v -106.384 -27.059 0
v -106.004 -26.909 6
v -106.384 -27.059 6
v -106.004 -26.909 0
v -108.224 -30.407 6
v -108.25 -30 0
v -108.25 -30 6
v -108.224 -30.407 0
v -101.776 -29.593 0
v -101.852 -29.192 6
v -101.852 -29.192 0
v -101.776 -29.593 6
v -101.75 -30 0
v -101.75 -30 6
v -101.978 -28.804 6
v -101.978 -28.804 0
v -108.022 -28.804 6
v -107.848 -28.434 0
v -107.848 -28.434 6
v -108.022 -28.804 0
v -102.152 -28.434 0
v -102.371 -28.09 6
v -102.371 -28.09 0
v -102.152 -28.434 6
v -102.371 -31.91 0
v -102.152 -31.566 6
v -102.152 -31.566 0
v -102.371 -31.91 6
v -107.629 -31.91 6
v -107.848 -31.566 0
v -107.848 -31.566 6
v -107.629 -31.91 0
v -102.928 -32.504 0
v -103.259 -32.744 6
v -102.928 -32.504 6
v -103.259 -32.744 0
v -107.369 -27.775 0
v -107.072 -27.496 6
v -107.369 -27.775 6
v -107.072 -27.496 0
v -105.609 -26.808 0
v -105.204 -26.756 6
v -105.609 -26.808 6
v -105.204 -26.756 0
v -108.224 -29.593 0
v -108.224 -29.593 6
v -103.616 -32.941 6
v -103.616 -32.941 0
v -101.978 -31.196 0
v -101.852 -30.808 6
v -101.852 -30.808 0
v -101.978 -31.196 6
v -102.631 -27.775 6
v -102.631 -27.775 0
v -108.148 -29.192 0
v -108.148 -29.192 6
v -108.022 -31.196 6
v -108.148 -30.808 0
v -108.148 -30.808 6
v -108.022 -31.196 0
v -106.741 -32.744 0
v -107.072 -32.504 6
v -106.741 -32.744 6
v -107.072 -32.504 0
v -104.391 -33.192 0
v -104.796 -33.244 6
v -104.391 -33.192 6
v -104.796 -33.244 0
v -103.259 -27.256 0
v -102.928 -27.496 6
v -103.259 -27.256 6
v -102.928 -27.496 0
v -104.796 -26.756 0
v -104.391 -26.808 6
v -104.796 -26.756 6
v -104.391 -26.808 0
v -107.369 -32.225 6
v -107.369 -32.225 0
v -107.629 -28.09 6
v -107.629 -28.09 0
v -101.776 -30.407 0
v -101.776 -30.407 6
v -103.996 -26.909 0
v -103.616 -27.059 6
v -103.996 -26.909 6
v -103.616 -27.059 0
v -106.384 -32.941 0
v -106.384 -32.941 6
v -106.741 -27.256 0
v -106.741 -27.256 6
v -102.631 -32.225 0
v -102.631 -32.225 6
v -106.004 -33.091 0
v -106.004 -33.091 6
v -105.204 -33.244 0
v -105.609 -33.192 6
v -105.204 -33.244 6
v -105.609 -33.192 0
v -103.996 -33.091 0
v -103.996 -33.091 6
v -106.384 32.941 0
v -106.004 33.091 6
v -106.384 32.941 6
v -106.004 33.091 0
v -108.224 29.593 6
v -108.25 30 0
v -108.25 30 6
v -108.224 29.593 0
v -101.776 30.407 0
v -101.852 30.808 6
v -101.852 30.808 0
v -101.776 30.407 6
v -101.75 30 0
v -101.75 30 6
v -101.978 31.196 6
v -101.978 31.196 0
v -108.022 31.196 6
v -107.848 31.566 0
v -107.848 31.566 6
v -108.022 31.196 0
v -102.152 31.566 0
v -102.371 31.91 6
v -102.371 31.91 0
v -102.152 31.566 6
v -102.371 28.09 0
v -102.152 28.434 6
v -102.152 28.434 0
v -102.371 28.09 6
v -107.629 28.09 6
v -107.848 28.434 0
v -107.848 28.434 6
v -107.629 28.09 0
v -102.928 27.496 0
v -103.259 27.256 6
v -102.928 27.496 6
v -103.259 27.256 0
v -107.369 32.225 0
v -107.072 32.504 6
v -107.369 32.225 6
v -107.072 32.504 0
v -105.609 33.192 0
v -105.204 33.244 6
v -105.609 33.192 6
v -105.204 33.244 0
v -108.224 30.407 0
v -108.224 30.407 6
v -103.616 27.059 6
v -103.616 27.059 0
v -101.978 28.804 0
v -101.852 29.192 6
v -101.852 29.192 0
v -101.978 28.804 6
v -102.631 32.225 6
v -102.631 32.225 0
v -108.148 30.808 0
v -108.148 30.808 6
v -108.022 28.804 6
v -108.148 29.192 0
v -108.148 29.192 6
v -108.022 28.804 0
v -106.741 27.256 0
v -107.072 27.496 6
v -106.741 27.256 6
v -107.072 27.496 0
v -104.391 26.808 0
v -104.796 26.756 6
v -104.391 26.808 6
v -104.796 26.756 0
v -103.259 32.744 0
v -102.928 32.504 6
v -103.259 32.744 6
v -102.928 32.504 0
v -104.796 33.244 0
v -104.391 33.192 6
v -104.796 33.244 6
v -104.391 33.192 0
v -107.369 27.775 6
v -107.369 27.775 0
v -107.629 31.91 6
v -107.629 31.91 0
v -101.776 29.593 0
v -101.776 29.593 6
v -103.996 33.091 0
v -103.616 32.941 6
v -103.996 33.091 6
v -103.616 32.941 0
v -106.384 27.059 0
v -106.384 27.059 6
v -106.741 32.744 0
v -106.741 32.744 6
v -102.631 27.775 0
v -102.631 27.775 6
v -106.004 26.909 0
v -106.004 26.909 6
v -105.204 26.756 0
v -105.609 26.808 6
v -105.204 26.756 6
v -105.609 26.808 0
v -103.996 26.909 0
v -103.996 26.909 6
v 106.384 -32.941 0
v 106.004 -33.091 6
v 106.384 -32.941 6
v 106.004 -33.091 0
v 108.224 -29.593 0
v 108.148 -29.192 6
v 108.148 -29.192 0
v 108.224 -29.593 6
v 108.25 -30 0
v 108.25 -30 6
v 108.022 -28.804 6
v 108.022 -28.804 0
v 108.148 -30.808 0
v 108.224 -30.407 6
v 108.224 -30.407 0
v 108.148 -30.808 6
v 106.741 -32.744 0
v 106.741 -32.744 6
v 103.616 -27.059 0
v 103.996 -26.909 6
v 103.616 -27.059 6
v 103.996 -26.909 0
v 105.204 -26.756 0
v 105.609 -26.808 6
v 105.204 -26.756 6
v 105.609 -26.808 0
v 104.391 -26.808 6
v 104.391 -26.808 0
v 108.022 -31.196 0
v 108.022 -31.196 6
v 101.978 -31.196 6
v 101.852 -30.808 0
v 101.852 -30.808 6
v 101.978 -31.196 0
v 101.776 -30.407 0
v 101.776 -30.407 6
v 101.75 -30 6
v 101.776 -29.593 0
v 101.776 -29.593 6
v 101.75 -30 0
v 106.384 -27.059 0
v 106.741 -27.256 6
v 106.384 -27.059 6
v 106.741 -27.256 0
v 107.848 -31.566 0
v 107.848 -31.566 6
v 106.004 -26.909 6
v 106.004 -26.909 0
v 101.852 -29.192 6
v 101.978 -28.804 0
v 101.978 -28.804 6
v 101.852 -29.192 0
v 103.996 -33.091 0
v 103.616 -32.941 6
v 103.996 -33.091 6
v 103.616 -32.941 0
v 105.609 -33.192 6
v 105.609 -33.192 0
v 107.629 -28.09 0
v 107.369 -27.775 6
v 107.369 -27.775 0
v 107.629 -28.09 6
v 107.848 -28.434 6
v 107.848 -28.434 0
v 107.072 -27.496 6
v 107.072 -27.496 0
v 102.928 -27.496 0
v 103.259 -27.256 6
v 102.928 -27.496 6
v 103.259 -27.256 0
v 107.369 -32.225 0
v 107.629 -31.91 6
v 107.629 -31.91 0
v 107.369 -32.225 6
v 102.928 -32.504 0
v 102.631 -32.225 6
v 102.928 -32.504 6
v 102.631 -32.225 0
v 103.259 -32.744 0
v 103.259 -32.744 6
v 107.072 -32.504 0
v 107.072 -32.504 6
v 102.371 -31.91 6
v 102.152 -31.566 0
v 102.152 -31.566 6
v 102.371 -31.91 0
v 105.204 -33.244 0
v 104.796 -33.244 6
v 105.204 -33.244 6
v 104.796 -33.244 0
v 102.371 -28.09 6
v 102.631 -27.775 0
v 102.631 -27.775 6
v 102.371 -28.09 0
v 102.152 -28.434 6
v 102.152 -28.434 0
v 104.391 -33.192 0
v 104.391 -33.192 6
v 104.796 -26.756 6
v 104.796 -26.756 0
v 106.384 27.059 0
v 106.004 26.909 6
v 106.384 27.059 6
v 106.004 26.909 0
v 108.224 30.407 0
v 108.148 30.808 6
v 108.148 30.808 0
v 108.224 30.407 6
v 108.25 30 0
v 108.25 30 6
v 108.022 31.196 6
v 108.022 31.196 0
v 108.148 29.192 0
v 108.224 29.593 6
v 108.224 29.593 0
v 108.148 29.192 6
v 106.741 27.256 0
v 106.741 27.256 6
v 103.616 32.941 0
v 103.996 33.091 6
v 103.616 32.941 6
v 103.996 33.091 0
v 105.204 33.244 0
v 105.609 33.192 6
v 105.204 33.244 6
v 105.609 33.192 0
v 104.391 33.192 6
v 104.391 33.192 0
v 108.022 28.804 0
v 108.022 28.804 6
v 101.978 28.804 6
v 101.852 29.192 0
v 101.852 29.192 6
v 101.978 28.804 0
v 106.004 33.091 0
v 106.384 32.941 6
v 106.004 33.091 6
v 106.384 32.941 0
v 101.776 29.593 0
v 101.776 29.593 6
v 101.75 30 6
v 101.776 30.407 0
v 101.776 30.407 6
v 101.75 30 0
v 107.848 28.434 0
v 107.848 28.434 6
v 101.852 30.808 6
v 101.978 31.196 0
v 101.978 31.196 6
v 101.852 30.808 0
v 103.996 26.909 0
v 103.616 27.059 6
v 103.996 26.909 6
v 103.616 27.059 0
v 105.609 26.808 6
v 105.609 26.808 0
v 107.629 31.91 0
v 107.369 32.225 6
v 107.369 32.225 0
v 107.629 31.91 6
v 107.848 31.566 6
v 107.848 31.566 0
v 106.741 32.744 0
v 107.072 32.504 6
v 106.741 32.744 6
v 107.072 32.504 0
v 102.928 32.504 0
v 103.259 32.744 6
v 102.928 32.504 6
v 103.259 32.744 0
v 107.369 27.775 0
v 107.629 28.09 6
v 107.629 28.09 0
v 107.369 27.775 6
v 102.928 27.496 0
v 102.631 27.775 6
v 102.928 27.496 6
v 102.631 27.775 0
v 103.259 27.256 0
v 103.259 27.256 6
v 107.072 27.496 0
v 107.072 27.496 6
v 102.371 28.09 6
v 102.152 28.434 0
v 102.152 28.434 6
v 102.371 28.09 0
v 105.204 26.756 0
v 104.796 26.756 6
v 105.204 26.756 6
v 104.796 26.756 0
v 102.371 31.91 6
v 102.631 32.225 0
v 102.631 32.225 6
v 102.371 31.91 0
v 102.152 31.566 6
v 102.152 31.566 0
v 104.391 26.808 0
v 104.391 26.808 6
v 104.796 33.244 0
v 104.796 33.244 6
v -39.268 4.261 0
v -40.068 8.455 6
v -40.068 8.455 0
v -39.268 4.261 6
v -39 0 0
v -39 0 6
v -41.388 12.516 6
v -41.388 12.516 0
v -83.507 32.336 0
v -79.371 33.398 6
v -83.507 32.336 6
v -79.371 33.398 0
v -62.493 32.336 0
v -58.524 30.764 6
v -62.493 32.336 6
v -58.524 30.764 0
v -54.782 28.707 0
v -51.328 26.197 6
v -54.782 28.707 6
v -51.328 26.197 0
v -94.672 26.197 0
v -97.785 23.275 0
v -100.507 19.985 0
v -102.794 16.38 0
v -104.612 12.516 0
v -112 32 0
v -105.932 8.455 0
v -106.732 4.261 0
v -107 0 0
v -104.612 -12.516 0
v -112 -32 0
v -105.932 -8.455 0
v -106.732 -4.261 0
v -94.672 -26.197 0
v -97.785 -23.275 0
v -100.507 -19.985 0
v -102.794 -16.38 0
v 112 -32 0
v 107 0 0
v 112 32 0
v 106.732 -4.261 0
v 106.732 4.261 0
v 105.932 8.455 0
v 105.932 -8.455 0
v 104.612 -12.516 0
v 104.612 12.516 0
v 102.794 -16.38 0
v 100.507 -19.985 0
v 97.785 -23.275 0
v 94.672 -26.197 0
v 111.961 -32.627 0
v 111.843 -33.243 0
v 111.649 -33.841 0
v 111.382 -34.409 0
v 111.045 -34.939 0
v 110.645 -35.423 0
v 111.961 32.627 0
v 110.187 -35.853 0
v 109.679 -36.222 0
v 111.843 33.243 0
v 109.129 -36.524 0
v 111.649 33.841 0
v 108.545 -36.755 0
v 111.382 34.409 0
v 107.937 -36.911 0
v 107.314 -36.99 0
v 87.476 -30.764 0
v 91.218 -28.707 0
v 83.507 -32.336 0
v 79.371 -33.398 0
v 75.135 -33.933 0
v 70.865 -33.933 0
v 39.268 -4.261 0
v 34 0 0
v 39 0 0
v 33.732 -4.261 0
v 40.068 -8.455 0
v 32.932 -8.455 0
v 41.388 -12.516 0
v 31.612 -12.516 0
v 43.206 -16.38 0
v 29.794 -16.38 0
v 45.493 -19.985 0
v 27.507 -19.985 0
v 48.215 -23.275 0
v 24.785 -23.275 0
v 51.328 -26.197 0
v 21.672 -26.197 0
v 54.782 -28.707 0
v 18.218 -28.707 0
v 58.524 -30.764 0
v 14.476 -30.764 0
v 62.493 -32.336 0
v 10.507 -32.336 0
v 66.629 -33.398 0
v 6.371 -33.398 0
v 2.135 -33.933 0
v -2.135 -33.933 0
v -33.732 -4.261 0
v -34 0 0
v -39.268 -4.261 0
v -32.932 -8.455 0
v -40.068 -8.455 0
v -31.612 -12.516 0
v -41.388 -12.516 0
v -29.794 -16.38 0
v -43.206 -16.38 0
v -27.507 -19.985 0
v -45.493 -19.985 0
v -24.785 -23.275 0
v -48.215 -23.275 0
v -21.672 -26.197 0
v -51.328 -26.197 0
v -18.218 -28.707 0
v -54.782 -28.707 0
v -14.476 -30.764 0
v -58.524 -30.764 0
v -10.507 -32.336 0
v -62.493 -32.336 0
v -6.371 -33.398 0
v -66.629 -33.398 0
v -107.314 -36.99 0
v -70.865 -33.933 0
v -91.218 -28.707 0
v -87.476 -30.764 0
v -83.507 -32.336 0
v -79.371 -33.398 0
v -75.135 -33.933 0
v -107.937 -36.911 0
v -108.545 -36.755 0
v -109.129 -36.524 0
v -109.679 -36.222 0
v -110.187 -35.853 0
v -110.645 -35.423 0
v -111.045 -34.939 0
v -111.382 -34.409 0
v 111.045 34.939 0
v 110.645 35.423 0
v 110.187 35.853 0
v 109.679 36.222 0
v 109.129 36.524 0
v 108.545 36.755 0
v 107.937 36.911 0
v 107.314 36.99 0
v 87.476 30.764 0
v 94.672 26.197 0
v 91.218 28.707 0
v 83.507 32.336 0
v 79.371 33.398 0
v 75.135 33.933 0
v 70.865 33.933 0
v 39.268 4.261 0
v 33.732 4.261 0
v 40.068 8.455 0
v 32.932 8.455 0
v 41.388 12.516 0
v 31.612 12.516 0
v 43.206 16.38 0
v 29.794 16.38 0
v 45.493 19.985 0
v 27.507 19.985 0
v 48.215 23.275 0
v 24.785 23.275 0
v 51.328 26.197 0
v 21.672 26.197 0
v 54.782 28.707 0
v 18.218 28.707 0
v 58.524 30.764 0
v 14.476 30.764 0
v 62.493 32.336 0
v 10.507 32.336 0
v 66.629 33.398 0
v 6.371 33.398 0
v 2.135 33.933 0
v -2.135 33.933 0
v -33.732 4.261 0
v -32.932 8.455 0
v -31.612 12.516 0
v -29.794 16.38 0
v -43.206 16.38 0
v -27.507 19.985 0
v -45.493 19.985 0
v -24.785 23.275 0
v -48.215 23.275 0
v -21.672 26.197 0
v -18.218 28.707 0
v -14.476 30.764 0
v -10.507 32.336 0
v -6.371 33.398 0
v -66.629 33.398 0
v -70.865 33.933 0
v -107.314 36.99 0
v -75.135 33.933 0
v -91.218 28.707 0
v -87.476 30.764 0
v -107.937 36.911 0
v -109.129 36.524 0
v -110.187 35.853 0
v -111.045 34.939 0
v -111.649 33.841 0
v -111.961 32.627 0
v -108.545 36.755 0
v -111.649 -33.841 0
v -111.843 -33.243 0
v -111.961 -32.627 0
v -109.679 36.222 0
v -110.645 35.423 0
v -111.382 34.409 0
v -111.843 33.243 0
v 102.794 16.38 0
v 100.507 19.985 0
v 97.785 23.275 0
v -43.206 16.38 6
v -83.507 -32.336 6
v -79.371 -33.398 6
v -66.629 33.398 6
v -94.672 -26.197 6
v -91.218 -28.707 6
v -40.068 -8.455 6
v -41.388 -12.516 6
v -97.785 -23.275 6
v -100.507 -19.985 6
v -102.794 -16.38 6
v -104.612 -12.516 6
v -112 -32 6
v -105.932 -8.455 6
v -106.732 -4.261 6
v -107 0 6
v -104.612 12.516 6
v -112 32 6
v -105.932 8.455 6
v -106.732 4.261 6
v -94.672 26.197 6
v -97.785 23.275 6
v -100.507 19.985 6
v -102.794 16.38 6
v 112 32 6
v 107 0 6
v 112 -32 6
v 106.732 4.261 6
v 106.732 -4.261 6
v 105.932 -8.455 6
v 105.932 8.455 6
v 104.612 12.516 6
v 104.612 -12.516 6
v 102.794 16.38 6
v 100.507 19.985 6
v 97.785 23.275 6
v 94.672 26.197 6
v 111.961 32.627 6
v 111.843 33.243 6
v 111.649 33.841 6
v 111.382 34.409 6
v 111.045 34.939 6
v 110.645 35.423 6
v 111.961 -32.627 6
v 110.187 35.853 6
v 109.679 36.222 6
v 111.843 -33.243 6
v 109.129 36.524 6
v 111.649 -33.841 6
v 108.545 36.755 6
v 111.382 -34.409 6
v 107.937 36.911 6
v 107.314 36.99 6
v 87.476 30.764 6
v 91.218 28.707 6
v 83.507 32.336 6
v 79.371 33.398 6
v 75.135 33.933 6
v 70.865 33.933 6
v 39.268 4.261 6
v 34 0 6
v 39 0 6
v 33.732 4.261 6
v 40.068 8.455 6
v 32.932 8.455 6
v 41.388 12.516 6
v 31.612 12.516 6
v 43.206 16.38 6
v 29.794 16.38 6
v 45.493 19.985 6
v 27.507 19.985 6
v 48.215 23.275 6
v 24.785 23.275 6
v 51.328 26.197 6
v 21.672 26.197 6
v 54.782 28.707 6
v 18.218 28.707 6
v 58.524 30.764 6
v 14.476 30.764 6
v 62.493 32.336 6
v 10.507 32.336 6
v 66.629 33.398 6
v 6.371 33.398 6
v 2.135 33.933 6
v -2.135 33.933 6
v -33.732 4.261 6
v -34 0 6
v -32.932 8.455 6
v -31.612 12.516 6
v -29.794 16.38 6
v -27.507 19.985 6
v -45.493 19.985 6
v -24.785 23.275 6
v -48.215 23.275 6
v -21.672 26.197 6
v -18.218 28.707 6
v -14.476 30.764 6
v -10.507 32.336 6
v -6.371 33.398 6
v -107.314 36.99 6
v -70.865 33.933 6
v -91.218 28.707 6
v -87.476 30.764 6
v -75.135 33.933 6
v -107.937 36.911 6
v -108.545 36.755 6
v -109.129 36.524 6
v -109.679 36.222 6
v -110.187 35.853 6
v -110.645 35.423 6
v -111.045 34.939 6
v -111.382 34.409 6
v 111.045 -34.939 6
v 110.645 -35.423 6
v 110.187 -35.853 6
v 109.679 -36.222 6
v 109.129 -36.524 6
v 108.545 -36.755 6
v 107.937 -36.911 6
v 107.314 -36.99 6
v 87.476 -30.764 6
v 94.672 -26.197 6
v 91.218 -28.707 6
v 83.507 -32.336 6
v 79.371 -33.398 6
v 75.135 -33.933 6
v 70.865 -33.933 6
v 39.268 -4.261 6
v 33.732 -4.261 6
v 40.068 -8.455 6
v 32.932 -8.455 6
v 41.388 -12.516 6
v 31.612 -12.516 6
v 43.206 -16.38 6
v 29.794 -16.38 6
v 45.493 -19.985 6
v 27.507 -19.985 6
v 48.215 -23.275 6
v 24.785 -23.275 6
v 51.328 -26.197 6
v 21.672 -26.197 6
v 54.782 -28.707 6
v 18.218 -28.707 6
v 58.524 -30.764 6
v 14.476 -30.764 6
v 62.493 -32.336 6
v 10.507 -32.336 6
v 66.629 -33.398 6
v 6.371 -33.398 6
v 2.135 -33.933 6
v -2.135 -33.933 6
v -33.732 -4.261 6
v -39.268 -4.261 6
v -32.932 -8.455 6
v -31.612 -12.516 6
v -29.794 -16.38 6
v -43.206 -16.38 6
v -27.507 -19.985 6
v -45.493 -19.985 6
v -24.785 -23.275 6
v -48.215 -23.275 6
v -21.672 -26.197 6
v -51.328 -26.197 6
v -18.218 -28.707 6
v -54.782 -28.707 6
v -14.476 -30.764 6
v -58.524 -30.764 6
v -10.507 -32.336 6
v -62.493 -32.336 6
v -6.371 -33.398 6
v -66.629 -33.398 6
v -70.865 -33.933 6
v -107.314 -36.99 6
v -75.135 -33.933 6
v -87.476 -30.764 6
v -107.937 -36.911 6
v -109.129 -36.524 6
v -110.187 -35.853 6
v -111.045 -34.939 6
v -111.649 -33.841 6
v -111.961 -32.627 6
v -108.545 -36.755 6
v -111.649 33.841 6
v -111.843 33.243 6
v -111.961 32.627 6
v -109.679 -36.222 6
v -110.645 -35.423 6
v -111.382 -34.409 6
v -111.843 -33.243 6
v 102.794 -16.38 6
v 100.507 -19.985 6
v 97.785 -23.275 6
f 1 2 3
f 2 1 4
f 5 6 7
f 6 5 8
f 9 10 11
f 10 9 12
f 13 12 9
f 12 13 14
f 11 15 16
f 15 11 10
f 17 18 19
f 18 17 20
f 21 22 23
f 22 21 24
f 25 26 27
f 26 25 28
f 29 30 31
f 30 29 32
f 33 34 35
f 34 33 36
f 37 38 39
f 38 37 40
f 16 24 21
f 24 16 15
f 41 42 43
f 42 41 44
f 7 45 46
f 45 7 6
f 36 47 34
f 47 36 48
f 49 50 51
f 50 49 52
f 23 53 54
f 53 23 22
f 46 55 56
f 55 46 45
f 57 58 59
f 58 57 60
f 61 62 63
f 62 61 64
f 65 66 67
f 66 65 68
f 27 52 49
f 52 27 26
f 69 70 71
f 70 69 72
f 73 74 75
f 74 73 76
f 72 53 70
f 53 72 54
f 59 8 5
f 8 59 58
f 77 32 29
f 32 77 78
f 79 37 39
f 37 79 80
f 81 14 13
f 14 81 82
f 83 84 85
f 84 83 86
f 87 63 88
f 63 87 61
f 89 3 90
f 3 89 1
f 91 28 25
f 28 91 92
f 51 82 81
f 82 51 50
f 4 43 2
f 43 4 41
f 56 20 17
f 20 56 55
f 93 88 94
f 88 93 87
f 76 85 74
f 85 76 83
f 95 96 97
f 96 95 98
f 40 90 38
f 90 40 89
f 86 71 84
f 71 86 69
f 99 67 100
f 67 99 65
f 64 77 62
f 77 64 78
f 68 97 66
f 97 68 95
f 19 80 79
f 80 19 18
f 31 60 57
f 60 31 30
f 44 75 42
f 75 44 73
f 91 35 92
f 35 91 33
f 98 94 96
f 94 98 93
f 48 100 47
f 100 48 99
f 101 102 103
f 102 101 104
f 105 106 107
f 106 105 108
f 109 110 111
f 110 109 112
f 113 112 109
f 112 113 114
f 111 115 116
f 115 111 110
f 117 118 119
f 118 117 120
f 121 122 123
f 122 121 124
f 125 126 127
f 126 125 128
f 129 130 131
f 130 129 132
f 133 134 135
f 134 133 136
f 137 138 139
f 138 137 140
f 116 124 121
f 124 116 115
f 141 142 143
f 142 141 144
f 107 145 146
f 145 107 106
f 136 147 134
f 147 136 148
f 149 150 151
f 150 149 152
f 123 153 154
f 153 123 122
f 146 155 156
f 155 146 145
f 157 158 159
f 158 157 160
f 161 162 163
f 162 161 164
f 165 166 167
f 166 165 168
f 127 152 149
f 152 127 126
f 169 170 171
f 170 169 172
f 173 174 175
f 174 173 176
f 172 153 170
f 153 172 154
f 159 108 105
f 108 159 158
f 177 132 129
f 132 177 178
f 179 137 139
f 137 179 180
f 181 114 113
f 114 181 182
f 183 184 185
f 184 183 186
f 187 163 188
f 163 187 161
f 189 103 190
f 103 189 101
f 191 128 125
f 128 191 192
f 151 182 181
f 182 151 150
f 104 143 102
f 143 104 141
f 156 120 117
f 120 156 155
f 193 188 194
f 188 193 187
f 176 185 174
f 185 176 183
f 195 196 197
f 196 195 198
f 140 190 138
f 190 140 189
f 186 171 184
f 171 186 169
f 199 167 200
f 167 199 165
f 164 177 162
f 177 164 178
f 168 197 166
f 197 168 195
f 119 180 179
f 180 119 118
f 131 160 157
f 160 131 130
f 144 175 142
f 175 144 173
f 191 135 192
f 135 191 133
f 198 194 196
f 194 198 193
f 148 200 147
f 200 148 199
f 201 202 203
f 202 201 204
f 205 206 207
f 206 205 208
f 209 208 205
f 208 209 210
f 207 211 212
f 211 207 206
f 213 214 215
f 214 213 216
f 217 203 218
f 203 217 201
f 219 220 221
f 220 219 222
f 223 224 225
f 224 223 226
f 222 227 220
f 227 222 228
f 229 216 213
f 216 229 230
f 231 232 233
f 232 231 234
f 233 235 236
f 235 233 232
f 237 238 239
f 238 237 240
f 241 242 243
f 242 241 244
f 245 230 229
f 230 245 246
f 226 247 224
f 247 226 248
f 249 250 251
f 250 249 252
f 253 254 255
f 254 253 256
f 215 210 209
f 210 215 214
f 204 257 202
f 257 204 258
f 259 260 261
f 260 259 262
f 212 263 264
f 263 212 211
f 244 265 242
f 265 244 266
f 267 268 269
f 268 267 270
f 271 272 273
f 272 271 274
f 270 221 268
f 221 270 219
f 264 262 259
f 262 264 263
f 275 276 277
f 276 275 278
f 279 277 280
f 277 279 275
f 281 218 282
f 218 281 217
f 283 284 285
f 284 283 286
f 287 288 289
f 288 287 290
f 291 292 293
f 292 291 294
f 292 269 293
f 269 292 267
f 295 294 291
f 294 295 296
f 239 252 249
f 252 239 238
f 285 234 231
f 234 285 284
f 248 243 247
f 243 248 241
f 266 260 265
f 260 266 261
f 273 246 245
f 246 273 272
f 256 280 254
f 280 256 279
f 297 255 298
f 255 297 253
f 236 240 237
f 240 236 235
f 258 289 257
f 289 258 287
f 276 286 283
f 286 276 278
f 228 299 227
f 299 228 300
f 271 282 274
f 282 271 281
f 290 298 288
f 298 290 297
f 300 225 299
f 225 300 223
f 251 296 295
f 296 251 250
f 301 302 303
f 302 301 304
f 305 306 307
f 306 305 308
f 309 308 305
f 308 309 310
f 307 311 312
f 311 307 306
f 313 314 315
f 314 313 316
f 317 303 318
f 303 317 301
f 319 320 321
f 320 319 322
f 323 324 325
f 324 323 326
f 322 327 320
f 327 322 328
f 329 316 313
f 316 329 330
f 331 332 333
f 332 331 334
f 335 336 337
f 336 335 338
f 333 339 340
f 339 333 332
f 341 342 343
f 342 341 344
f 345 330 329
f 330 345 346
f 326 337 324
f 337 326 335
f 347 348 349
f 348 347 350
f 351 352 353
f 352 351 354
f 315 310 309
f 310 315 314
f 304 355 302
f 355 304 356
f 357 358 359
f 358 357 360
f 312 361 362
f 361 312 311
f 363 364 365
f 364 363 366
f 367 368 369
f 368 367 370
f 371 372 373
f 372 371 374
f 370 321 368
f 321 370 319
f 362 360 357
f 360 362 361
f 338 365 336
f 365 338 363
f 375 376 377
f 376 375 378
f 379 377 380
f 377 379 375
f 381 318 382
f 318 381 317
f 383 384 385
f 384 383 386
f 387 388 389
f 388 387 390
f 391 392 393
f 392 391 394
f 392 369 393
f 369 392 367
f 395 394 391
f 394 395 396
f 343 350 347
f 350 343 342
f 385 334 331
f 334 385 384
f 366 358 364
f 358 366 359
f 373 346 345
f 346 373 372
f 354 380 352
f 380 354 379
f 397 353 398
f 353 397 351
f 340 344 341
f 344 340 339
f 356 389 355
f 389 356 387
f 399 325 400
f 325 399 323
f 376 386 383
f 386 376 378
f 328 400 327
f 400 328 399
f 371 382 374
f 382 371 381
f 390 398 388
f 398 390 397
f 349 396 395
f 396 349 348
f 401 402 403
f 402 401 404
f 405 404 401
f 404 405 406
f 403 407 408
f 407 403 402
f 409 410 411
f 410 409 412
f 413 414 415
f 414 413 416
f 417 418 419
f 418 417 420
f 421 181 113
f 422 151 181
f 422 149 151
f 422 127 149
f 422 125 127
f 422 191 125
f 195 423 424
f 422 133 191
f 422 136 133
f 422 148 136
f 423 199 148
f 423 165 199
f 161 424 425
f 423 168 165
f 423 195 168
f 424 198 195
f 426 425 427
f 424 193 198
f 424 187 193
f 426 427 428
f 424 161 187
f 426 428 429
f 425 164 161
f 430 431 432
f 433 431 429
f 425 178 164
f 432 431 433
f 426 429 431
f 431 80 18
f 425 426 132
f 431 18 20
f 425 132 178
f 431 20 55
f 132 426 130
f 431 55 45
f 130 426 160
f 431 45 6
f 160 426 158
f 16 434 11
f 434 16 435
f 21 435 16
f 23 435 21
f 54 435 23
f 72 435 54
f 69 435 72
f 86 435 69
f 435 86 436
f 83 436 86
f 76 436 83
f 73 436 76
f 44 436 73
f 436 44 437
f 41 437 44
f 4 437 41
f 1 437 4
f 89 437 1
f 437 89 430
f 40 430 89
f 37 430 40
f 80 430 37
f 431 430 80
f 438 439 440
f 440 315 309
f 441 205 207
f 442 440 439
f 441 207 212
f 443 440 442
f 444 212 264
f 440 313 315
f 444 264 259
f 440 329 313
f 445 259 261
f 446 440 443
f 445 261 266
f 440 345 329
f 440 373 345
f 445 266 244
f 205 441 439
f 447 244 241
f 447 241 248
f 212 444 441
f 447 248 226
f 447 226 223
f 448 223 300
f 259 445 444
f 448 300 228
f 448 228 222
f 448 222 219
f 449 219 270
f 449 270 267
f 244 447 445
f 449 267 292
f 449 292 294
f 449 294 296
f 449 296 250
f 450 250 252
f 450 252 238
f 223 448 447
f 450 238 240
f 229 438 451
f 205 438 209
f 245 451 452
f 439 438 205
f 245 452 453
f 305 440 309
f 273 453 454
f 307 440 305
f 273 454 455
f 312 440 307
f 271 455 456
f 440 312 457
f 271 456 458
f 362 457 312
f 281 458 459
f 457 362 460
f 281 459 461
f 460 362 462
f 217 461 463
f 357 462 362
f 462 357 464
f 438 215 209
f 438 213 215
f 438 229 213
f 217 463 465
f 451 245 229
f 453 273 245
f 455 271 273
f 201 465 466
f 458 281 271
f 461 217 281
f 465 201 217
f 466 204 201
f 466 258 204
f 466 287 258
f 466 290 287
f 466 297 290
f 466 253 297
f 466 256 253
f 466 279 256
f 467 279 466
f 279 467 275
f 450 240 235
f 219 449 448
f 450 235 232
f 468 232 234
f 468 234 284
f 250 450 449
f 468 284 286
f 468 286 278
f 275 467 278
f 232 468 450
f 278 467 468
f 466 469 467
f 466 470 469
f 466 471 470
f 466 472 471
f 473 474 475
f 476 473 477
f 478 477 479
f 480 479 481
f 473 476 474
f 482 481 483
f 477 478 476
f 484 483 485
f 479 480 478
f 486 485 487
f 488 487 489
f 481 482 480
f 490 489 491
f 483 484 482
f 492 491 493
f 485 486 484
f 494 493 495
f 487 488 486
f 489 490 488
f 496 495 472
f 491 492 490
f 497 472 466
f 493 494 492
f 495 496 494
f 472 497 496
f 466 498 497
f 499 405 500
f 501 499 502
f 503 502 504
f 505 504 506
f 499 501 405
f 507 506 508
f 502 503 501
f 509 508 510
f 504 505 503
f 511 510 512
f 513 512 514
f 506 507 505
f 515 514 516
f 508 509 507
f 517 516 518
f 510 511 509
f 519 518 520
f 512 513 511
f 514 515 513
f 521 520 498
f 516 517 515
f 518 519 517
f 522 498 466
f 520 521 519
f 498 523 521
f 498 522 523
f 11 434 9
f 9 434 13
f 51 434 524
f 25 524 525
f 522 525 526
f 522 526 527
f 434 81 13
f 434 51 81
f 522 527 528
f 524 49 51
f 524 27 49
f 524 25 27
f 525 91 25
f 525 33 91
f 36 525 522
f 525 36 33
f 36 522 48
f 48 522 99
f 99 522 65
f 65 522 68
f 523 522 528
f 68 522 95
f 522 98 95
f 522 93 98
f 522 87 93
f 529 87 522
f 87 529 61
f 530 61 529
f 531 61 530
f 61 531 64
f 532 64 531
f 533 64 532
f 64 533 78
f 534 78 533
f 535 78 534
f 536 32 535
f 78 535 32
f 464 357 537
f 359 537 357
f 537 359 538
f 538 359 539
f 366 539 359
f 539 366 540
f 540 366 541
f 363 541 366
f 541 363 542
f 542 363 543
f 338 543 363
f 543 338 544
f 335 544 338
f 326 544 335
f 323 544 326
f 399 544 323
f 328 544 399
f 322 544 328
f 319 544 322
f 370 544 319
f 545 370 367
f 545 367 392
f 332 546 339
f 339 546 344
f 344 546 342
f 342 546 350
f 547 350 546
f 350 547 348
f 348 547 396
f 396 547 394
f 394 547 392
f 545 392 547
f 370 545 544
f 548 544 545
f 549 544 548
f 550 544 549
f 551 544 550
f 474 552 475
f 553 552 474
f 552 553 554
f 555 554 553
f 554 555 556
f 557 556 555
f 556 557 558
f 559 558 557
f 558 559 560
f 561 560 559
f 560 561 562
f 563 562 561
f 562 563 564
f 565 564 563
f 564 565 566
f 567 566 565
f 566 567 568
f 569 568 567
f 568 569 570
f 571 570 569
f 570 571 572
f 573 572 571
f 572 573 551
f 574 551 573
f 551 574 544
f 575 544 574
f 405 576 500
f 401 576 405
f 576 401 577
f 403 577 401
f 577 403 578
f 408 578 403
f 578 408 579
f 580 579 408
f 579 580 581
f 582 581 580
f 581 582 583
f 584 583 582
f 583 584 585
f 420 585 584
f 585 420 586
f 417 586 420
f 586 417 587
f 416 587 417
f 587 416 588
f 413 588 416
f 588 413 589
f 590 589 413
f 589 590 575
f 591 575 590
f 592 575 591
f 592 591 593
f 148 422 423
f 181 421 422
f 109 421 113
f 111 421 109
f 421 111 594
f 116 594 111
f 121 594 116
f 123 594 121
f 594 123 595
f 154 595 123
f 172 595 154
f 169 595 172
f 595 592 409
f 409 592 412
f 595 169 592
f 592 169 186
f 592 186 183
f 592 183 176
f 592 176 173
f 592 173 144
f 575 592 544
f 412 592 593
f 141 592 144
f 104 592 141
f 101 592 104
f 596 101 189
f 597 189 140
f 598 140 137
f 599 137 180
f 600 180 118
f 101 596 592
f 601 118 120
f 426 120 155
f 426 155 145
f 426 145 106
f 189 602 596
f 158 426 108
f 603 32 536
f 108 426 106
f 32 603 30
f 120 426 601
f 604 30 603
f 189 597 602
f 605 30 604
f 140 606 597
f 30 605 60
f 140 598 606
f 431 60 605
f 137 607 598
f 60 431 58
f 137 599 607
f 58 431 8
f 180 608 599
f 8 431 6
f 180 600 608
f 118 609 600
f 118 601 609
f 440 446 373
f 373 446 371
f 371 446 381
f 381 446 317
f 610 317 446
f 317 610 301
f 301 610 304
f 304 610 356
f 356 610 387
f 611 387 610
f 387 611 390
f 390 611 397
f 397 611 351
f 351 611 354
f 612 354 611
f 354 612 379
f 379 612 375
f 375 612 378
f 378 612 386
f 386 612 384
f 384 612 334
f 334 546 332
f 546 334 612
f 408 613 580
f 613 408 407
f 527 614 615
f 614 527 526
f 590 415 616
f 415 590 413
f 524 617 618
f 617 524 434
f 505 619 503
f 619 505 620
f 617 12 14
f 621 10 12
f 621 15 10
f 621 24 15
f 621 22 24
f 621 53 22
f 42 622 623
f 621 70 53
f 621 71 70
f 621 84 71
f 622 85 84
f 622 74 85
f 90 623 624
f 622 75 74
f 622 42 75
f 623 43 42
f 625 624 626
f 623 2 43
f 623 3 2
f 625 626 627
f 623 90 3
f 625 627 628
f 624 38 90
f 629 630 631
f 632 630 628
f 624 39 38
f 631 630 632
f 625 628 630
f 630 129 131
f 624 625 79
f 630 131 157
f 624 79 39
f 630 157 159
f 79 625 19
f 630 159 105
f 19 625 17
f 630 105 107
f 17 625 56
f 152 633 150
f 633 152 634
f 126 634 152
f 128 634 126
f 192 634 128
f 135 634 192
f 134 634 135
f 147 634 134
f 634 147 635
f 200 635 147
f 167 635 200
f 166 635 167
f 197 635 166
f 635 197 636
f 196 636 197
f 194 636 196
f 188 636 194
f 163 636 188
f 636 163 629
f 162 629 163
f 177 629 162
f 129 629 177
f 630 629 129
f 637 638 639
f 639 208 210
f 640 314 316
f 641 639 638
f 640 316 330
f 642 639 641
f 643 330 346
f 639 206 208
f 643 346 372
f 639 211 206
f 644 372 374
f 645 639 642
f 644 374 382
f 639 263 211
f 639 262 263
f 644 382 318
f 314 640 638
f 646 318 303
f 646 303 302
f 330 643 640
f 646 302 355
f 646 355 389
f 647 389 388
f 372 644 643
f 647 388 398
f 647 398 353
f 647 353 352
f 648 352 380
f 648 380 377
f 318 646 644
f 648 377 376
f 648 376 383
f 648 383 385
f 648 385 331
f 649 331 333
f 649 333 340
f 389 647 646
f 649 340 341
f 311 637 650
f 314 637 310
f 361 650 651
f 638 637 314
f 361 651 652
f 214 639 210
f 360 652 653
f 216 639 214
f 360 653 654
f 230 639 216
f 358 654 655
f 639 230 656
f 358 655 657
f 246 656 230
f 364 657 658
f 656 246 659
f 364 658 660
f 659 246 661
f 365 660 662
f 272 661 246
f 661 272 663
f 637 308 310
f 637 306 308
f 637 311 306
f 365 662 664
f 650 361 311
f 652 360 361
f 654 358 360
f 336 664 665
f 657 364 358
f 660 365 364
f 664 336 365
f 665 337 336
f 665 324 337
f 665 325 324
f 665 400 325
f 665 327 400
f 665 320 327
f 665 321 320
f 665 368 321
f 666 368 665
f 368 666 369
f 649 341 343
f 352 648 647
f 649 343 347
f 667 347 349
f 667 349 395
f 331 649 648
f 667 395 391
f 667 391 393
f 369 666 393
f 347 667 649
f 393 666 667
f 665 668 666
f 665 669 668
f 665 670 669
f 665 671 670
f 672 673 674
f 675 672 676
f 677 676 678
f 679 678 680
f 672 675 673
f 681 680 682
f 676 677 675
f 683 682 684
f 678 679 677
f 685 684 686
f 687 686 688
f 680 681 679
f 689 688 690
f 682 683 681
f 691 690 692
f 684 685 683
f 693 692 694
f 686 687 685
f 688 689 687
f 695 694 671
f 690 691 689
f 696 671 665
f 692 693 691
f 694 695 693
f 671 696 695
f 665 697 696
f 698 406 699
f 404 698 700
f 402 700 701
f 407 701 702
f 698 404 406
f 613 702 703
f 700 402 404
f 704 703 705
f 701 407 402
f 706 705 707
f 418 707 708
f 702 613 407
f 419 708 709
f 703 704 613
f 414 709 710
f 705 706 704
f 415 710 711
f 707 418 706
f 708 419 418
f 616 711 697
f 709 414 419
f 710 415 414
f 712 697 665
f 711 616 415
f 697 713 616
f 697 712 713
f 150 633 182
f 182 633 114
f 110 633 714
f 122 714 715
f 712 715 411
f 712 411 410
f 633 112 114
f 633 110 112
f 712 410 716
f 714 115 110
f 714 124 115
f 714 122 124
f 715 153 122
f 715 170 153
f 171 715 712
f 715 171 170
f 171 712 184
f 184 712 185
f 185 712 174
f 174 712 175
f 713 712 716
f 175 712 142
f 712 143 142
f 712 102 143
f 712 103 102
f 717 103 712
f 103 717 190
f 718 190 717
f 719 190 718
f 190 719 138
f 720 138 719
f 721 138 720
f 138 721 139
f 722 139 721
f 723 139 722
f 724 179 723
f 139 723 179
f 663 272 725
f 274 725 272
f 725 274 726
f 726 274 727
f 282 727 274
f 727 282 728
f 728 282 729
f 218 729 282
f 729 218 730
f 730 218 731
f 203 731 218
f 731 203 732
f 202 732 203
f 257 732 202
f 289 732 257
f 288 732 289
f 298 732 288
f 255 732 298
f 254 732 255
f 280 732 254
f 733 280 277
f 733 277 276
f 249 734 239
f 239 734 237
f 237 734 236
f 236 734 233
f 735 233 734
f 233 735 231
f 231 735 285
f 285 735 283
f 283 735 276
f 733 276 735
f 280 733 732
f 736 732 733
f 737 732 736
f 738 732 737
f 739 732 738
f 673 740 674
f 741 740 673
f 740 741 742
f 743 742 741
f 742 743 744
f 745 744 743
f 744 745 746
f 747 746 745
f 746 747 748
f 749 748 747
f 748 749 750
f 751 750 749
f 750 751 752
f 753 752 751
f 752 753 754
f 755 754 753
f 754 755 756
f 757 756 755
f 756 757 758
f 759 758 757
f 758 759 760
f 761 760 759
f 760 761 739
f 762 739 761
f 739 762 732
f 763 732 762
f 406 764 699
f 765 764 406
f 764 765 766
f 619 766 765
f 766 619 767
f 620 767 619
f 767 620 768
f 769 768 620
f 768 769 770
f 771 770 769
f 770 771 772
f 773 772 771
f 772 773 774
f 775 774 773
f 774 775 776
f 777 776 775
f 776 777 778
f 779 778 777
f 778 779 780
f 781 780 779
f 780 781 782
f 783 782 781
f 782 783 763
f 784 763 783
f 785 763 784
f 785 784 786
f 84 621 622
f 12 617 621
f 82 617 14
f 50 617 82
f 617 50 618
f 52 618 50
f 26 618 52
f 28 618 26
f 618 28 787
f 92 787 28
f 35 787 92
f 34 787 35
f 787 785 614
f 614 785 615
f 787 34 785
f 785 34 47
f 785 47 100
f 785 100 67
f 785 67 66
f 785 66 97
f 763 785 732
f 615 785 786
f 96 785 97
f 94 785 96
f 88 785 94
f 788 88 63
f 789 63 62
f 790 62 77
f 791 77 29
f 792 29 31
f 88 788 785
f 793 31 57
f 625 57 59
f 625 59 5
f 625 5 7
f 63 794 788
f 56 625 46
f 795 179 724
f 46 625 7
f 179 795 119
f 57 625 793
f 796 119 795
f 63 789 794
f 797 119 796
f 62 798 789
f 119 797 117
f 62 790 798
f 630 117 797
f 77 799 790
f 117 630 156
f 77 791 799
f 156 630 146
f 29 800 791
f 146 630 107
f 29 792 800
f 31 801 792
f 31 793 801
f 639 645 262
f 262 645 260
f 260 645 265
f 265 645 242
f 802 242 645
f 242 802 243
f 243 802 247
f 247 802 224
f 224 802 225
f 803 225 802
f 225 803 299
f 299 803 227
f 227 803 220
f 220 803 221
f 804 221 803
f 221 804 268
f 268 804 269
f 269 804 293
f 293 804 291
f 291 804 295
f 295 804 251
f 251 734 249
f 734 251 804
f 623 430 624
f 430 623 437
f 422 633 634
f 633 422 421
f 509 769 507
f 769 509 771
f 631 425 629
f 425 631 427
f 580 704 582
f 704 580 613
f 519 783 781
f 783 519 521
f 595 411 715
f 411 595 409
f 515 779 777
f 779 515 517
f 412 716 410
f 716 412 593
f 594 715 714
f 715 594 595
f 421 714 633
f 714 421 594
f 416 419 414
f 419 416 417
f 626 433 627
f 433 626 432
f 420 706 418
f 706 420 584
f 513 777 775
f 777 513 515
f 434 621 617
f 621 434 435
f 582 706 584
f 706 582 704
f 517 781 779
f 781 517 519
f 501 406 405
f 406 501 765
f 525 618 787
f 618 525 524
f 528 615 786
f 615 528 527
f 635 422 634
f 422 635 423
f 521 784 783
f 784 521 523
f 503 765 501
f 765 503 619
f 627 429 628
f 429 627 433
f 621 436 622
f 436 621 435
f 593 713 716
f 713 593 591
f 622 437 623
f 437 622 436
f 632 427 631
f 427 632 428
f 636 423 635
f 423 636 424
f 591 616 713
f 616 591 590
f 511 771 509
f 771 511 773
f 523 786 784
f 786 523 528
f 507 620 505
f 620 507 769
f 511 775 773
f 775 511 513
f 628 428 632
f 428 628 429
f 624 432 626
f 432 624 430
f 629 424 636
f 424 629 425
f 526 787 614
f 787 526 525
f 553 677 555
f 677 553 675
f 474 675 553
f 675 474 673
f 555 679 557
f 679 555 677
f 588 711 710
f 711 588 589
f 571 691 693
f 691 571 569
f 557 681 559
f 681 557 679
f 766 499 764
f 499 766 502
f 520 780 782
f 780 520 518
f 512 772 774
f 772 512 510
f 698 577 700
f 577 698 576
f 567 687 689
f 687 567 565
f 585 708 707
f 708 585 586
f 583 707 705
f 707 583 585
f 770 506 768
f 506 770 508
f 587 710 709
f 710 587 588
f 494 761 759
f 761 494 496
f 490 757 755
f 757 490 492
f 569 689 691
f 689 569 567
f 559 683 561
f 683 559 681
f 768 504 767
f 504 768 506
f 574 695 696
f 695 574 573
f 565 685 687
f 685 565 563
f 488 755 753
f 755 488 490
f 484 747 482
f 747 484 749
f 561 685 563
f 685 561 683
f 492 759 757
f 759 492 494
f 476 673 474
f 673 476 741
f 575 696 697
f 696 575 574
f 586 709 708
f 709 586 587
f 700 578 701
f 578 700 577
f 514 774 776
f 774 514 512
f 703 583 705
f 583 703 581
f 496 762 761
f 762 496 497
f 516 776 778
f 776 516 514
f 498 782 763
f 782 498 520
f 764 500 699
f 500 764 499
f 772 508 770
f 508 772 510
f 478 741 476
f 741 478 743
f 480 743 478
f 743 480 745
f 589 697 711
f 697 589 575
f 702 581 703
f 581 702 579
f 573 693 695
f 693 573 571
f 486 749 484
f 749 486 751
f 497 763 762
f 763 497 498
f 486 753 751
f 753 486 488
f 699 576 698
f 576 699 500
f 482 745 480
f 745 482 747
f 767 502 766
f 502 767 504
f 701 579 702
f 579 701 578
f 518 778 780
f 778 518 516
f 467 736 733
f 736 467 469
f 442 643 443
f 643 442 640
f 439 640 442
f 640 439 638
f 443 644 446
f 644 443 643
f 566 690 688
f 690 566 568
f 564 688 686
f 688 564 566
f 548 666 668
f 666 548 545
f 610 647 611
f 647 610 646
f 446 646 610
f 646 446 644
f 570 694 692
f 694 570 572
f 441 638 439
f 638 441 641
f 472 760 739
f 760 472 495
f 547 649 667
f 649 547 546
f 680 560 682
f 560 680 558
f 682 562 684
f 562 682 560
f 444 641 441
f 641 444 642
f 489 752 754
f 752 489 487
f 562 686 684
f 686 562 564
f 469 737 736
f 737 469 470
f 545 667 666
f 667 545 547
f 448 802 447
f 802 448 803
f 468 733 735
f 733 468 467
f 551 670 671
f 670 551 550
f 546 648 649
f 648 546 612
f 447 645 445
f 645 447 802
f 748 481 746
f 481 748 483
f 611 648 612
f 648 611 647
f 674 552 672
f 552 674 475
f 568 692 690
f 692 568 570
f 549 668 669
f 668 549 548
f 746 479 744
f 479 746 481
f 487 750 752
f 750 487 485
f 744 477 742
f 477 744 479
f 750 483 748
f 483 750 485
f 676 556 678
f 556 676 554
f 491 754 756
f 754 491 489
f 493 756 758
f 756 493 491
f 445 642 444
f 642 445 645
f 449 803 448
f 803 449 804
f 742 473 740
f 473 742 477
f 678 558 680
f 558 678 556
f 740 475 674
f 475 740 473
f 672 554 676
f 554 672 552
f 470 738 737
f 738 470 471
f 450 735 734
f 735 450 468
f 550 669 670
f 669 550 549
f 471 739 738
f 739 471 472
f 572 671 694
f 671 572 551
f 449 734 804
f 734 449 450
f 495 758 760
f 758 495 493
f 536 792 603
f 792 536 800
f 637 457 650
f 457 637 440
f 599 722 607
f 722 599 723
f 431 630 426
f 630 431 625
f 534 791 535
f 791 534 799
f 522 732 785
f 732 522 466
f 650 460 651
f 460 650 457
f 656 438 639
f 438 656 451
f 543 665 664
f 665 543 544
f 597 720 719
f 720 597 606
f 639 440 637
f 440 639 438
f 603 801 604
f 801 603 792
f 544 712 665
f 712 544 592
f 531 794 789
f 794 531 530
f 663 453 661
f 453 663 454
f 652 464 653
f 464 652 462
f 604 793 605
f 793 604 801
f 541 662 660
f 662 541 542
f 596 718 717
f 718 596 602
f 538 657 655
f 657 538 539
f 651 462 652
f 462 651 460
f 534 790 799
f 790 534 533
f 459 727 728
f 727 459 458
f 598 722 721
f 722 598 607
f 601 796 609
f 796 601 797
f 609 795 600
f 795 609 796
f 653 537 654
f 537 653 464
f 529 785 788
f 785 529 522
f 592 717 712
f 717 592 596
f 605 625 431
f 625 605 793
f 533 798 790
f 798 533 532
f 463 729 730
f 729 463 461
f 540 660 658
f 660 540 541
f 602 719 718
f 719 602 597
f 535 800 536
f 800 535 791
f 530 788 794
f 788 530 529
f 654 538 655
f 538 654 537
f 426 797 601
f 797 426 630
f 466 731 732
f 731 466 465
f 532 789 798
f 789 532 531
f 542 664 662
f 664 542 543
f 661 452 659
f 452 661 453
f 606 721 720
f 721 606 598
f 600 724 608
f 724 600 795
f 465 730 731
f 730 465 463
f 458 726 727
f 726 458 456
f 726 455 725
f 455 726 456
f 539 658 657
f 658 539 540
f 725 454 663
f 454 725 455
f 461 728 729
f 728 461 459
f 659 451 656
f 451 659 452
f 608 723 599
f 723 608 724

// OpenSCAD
$fn = 50;


difference() {
	union() {
		hull() {
			translate(v = [-107.0000000000, 32.0000000000, 0]) {
				cylinder(h = 6, r = 5);
			}
			translate(v = [107.0000000000, 32.0000000000, 0]) {
				cylinder(h = 6, r = 5);
			}
			translate(v = [-107.0000000000, -32.0000000000, 0]) {
				cylinder(h = 6, r = 5);
			}
			translate(v = [107.0000000000, -32.0000000000, 0]) {
				cylinder(h = 6, r = 5);
			}
		}
	}
	union() {
		#translate(v = [-105.0000000000, -30.0000000000, -100.0000000000]) {
			cylinder(h = 200, r = 3.2500000000);
		}
		#translate(v = [-105.0000000000, 30.0000000000, -100.0000000000]) {
			cylinder(h = 200, r = 3.2500000000);
		}
		#translate(v = [105.0000000000, -30.0000000000, -100.0000000000]) {
			cylinder(h = 200, r = 3.2500000000);
		}
		#translate(v = [105.0000000000, 30.0000000000, -100.0000000000]) {
			cylinder(h = 200, r = 3.2500000000);
		}
		#translate(v = [-73.0000000000, 0, 0]) {
			cylinder(h = 6, r = 34.0000000000);
		}
		#cylinder(h = 6, r = 34.0000000000);
		#translate(v = [73.0000000000, 0, 0]) {
			cylinder(h = 6, r = 34.0000000000);
		}
	}
}
